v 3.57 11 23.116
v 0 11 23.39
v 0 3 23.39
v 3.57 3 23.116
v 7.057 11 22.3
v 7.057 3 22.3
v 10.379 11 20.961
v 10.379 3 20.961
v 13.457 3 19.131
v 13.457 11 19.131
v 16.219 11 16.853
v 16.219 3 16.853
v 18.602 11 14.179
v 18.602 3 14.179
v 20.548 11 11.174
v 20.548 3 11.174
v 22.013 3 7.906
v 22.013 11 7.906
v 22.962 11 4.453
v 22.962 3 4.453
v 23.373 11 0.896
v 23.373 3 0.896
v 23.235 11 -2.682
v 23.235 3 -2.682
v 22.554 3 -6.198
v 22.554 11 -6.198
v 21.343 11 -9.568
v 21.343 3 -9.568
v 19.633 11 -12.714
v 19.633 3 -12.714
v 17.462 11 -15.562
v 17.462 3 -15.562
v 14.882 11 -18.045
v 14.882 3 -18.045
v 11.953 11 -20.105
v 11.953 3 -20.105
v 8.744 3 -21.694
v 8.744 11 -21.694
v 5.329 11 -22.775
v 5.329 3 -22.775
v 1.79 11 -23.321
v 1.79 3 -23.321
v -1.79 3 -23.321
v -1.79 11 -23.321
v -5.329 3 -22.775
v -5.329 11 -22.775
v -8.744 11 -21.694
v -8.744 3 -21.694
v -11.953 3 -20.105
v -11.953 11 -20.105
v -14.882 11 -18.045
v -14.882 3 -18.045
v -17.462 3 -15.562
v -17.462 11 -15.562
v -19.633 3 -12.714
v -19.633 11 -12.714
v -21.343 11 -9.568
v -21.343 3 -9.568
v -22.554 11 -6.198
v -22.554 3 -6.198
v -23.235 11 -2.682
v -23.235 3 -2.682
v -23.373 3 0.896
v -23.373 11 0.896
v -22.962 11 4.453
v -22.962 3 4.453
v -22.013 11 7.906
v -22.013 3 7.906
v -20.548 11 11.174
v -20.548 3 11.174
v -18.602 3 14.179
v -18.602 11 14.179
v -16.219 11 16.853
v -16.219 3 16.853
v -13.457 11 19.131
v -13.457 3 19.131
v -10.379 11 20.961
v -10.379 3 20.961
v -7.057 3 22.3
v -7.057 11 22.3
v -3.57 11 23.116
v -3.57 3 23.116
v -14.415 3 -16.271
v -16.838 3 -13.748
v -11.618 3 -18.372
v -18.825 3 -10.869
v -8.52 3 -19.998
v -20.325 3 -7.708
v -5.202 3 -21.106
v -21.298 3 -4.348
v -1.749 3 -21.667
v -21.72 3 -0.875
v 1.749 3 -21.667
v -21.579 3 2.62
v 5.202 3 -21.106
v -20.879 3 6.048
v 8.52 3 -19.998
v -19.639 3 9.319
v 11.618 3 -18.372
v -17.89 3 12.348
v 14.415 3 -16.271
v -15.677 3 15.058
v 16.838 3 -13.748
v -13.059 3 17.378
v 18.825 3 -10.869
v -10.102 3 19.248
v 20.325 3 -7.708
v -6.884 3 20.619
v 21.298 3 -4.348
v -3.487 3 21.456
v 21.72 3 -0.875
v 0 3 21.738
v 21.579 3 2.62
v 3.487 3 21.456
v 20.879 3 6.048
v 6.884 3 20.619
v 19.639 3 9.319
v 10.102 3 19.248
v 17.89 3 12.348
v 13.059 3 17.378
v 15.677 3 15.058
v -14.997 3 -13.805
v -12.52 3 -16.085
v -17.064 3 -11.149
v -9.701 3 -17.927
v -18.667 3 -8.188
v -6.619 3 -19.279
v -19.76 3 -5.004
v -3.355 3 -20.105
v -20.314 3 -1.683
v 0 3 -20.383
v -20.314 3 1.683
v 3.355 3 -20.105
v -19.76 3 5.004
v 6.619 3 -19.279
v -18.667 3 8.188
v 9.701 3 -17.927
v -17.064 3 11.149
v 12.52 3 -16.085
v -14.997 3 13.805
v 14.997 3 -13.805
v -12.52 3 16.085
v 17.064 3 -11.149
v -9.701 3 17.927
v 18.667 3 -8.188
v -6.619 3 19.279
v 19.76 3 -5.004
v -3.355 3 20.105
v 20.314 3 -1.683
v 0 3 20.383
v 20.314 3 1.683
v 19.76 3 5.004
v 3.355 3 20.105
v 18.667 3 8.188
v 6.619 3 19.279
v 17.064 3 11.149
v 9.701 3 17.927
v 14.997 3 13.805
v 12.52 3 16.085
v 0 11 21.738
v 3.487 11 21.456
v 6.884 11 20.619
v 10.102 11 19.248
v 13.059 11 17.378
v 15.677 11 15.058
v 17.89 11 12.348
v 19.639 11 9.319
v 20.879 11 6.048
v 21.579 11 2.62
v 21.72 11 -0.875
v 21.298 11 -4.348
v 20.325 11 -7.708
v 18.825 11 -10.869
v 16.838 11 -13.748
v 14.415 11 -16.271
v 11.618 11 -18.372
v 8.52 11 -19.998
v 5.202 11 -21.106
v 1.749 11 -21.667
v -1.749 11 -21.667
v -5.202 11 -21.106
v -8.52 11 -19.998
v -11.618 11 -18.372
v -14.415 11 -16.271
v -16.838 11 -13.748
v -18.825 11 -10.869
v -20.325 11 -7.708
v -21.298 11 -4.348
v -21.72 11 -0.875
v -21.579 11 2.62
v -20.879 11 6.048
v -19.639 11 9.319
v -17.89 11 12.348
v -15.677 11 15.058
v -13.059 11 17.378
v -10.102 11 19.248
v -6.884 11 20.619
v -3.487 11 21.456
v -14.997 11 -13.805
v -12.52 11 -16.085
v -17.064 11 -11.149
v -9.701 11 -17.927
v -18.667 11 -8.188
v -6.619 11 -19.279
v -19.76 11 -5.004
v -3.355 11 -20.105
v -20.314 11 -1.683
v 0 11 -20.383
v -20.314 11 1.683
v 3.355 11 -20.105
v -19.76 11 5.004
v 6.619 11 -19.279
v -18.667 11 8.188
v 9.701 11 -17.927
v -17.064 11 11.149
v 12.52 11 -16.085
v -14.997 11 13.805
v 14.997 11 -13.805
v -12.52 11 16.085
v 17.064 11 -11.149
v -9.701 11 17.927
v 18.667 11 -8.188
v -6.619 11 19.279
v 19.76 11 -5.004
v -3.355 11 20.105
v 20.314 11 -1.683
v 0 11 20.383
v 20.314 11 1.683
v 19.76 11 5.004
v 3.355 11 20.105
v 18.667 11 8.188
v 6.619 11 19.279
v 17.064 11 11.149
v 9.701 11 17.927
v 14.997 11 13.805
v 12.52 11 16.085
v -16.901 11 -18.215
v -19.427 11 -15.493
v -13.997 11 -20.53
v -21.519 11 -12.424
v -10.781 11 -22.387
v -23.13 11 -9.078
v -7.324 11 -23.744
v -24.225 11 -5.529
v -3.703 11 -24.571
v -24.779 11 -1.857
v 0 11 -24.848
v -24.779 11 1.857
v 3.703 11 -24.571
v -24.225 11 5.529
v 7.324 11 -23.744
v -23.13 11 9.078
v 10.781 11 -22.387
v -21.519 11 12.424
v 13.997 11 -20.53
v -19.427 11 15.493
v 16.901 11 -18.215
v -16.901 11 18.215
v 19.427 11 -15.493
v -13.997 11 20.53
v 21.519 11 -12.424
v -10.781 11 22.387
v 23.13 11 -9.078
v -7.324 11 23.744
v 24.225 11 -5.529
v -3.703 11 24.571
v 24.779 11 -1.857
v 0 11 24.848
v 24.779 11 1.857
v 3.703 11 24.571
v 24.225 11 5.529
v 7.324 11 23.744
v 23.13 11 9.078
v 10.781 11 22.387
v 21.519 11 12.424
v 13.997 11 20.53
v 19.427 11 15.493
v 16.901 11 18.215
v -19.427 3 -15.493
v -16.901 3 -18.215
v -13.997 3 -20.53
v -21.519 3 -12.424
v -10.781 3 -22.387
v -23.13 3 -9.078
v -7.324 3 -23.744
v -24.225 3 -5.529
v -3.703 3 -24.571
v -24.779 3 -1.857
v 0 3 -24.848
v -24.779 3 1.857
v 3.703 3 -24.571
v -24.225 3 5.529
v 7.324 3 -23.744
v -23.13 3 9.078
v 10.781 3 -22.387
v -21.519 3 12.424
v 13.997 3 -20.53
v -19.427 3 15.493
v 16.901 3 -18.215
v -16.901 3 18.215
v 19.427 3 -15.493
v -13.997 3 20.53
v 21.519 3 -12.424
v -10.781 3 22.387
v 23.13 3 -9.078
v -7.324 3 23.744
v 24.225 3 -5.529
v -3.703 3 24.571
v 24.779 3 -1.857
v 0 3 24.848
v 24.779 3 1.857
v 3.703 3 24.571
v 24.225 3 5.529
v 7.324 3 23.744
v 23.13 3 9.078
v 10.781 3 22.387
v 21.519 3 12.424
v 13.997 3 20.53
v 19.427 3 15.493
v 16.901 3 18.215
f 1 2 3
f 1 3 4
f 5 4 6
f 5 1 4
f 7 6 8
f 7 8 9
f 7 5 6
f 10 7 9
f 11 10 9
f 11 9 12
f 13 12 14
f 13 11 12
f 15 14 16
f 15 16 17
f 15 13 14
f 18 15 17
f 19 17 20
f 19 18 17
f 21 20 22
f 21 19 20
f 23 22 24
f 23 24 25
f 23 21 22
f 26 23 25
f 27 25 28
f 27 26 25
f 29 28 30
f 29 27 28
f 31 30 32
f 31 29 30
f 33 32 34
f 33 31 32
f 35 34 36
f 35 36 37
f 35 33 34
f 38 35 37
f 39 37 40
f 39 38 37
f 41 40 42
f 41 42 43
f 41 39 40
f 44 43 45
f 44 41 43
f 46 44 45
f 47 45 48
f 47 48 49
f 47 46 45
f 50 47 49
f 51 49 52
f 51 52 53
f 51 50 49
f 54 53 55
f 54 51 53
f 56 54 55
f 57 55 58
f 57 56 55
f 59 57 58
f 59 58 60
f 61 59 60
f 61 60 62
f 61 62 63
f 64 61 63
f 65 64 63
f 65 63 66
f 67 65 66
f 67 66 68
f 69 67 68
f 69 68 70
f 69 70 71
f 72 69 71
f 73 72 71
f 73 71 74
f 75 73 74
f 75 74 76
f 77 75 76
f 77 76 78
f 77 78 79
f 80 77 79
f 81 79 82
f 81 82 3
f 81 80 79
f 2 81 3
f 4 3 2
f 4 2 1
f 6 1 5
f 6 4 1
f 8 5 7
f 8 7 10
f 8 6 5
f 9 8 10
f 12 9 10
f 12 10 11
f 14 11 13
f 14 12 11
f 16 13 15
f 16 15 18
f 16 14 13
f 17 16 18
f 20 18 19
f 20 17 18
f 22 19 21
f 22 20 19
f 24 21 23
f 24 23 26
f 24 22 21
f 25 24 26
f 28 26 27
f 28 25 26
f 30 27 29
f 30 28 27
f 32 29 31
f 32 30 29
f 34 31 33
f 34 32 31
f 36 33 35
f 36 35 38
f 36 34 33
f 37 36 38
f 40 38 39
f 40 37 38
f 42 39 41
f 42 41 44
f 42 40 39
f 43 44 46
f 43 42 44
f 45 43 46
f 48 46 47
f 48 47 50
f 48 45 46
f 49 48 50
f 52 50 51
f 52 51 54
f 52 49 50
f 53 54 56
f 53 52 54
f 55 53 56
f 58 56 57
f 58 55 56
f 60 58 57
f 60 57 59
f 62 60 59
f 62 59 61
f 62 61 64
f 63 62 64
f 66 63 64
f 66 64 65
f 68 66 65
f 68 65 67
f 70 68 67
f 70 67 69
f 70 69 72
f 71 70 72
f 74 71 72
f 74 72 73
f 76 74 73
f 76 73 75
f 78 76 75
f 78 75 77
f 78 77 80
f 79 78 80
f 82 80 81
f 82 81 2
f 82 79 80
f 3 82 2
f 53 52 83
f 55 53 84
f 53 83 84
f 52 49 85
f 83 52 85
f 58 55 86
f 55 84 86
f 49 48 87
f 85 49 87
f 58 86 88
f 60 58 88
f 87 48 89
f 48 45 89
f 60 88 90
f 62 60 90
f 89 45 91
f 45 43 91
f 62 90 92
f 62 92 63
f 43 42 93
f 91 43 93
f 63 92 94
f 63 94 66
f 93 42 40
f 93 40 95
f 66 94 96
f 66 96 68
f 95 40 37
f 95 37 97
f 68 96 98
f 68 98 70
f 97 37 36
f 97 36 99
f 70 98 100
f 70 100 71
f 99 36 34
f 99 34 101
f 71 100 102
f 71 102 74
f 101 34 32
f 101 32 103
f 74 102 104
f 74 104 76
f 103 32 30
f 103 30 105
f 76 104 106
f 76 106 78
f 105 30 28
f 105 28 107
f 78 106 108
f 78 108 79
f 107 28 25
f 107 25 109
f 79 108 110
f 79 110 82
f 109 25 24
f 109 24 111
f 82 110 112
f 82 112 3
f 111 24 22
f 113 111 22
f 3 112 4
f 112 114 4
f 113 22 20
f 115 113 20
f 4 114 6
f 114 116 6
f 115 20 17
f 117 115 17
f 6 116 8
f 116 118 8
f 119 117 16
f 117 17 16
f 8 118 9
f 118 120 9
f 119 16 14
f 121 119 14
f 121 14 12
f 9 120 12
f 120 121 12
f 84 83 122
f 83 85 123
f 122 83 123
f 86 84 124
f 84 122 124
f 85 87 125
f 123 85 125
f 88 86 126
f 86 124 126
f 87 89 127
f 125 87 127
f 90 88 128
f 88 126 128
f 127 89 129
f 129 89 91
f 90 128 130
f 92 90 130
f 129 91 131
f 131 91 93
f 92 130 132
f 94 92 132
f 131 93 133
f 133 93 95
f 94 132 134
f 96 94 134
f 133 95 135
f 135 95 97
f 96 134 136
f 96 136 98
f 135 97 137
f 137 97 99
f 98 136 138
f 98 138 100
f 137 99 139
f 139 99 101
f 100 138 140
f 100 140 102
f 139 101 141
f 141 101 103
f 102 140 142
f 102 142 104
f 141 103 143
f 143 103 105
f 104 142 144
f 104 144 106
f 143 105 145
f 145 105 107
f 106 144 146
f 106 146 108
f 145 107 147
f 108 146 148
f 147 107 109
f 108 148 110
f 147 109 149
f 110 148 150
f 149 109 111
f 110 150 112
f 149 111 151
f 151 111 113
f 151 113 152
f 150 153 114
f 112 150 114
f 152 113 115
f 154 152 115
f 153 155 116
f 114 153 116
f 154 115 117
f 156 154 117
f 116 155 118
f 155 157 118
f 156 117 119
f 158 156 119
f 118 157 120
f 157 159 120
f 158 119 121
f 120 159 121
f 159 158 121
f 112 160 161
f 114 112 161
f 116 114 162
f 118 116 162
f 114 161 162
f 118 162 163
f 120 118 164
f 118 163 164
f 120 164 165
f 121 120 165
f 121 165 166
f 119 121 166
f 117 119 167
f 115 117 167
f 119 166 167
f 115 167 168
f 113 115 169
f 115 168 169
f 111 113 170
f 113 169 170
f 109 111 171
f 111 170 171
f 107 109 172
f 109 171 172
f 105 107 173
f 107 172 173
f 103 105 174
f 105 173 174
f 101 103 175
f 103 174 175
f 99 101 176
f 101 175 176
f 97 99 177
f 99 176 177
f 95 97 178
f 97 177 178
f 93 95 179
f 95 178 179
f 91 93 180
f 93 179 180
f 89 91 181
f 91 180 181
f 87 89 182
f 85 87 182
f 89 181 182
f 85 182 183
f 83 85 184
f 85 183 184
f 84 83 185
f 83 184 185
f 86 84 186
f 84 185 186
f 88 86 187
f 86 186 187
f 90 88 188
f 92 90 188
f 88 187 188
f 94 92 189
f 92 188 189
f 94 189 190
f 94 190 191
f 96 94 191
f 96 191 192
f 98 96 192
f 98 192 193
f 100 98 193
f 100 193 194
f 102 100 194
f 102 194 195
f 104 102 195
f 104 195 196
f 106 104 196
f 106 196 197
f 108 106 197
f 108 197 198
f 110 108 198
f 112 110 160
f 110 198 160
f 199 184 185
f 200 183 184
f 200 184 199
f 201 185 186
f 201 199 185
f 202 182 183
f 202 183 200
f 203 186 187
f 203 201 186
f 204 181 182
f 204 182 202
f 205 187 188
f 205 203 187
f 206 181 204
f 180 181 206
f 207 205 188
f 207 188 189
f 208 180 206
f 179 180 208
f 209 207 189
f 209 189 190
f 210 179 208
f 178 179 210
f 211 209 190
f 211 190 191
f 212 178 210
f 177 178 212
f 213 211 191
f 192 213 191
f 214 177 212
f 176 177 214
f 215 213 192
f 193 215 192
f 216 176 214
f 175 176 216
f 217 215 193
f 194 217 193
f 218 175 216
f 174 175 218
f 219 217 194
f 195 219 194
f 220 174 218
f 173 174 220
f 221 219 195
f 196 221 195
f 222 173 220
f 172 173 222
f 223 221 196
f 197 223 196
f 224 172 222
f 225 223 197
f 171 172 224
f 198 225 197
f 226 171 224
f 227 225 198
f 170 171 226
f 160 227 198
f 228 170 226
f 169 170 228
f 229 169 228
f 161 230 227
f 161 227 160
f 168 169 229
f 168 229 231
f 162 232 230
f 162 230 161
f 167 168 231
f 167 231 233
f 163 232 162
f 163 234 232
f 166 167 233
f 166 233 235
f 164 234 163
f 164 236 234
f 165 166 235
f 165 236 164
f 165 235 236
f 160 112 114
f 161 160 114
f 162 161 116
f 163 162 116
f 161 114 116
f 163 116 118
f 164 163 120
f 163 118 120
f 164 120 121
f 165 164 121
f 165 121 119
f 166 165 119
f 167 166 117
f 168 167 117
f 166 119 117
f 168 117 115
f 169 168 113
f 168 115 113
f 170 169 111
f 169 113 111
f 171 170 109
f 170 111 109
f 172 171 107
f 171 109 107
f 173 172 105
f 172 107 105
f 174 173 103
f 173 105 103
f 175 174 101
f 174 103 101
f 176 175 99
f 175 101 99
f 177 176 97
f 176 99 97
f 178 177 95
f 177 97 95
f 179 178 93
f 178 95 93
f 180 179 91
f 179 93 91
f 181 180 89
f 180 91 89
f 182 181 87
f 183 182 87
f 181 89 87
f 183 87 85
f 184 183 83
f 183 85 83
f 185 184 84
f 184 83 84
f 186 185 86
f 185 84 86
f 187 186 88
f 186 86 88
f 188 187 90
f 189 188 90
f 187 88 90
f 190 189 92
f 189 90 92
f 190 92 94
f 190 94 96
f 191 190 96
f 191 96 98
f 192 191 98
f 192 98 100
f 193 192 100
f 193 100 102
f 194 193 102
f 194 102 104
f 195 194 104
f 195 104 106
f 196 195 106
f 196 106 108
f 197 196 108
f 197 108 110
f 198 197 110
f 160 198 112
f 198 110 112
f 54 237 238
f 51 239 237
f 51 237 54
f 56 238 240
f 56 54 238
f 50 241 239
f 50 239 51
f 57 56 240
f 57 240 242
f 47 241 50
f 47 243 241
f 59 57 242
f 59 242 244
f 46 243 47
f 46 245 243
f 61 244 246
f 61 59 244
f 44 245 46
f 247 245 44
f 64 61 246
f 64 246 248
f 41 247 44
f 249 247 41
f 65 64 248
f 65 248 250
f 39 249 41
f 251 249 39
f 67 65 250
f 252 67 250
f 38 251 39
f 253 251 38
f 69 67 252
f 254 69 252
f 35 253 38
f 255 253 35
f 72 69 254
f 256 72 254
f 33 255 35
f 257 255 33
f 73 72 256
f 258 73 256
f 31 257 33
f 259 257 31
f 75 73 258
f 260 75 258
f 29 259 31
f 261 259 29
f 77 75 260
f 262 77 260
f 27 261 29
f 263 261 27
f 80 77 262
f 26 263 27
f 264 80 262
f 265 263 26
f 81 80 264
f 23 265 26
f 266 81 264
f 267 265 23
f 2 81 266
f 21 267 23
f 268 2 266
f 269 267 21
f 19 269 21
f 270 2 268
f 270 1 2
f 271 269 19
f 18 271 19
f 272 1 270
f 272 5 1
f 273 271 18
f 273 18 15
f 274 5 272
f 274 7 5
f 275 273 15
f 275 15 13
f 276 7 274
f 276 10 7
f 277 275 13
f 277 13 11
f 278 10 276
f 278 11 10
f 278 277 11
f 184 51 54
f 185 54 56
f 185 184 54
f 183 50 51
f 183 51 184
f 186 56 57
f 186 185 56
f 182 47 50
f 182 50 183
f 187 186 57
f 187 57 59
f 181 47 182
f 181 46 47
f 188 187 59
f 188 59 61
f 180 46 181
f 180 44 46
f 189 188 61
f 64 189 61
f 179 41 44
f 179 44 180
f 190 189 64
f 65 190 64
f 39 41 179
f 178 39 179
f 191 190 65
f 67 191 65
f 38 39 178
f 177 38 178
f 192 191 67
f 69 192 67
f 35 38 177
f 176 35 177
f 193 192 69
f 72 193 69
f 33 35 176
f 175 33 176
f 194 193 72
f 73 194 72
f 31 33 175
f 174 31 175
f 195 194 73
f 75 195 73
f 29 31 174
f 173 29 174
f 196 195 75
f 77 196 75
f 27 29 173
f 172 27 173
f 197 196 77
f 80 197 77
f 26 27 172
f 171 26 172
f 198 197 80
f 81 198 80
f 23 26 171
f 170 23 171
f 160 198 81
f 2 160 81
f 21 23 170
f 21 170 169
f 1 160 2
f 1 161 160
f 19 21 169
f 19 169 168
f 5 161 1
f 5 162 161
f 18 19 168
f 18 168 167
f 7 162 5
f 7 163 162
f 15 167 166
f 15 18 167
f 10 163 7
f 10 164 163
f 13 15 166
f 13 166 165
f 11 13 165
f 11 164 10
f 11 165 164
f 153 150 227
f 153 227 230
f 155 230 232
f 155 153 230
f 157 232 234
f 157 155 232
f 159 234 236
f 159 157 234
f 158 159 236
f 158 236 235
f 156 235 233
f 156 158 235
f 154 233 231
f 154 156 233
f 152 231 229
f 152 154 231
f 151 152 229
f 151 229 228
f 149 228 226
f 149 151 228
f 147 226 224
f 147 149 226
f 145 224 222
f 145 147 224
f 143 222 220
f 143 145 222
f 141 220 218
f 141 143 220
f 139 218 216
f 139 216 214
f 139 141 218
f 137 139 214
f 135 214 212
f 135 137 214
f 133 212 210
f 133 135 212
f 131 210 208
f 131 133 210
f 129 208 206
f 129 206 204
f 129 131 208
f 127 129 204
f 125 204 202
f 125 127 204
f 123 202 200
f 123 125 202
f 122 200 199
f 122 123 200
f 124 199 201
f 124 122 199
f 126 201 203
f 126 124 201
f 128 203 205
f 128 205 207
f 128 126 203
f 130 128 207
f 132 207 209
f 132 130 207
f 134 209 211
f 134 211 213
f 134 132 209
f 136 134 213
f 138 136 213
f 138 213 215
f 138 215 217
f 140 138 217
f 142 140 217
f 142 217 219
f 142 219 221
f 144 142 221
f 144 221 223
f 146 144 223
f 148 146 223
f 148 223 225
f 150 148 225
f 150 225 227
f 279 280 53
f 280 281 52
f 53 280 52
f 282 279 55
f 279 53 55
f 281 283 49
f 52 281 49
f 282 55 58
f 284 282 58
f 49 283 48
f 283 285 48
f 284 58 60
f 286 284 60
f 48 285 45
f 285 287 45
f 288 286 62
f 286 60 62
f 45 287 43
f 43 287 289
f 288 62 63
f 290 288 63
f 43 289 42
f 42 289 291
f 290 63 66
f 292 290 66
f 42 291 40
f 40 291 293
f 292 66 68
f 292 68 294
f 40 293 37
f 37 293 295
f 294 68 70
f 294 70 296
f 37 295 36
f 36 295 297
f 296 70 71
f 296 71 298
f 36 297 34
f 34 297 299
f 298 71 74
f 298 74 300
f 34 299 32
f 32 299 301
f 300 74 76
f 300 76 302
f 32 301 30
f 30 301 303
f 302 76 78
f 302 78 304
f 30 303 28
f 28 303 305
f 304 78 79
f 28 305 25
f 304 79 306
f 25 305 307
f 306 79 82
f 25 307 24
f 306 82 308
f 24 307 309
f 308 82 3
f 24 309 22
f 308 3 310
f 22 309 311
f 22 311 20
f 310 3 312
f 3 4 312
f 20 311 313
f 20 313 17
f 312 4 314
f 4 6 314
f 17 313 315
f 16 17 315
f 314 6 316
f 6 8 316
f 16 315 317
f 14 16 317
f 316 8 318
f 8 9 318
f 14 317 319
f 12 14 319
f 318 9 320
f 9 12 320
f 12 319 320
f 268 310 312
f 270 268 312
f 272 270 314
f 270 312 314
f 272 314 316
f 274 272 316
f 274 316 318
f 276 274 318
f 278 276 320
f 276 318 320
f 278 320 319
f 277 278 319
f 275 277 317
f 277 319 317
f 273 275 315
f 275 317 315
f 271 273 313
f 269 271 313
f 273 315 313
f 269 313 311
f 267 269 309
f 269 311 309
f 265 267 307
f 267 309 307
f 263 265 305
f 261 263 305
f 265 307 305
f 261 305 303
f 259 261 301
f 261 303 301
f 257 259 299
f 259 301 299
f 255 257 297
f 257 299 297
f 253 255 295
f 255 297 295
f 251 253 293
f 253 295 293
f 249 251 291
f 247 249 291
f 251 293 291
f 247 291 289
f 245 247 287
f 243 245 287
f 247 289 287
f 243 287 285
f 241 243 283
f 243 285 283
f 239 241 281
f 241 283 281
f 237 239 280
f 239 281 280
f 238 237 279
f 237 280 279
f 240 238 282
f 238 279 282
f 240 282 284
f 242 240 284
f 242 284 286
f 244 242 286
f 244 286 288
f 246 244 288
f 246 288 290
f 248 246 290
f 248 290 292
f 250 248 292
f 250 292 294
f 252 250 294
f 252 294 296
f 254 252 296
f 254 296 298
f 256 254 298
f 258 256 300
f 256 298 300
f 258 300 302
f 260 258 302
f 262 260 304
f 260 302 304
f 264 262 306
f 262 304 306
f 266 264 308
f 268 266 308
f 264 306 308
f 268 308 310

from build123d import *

# Parameters (mm, degrees)
BOSS_EXTRUDE1_START = 3
SKETCH2_R           = 21.737647639
SKETCH2_R_2         = 20.383469786
BOSS_EXTRUDE1_DEPTH = 8
BOSS_EXTRUDE2_START = 3
SKETCH5_R           = 24.848113281
SKETCH5_R_2         = 23.389804227
BOSS_EXTRUDE2_DEPTH = 8
SKETCH6_R           = 23.389804227
SKETCH6_R_2         = 21.737647639
BOSS_EXTRUDE3_DEPTH = 8


with BuildPart() as part:
    # Sketch2 → Boss-Extrude1 (new body)
    with BuildSketch(Plane(origin=(0, 0, 0), x_dir=(1, 0, 0), z_dir=(0, 1, 0)).offset(BOSS_EXTRUDE1_START)):
        with Locations(Location((0, 0, 0), (0, 0, 270))):
            Circle(SKETCH2_R)
        with Locations(Location((0, 0, 0), (0, 0, 270))):
            Circle(SKETCH2_R_2, mode=Mode.SUBTRACT)
    extrude(amount=BOSS_EXTRUDE1_DEPTH)


with BuildPart() as body_2:
    # Sketch5 → Boss-Extrude2 (new body)
    with BuildSketch(Plane(origin=(0, 0, 0), x_dir=(1, 0, 0), z_dir=(0, 1, 0)).offset(BOSS_EXTRUDE2_START)):
        with Locations(Location((0, 0, 0), (0, 0, 270))):
            Circle(SKETCH5_R)
        with Locations(Location((0, 0, 0), (0, 0, 270))):
            Circle(SKETCH5_R_2, mode=Mode.SUBTRACT)
    extrude(amount=BOSS_EXTRUDE2_DEPTH)


with BuildPart() as body_3:
    # Sketch6 → Boss-Extrude3 (new body)
    with BuildSketch(Plane(origin=(0, 11, 0), x_dir=(1, 0, 0), z_dir=(0, 1, 0))):
        with Locations(Location((0, 0, 0), (0, 0, 270))):
            Circle(SKETCH6_R)
        with Locations(Location((0, 0, 0), (0, 0, 270))):
            Circle(SKETCH6_R_2, mode=Mode.SUBTRACT)
    extrude(amount=-BOSS_EXTRUDE3_DEPTH)


solid = Compound([part.part, body_2.part, body_3.part])
